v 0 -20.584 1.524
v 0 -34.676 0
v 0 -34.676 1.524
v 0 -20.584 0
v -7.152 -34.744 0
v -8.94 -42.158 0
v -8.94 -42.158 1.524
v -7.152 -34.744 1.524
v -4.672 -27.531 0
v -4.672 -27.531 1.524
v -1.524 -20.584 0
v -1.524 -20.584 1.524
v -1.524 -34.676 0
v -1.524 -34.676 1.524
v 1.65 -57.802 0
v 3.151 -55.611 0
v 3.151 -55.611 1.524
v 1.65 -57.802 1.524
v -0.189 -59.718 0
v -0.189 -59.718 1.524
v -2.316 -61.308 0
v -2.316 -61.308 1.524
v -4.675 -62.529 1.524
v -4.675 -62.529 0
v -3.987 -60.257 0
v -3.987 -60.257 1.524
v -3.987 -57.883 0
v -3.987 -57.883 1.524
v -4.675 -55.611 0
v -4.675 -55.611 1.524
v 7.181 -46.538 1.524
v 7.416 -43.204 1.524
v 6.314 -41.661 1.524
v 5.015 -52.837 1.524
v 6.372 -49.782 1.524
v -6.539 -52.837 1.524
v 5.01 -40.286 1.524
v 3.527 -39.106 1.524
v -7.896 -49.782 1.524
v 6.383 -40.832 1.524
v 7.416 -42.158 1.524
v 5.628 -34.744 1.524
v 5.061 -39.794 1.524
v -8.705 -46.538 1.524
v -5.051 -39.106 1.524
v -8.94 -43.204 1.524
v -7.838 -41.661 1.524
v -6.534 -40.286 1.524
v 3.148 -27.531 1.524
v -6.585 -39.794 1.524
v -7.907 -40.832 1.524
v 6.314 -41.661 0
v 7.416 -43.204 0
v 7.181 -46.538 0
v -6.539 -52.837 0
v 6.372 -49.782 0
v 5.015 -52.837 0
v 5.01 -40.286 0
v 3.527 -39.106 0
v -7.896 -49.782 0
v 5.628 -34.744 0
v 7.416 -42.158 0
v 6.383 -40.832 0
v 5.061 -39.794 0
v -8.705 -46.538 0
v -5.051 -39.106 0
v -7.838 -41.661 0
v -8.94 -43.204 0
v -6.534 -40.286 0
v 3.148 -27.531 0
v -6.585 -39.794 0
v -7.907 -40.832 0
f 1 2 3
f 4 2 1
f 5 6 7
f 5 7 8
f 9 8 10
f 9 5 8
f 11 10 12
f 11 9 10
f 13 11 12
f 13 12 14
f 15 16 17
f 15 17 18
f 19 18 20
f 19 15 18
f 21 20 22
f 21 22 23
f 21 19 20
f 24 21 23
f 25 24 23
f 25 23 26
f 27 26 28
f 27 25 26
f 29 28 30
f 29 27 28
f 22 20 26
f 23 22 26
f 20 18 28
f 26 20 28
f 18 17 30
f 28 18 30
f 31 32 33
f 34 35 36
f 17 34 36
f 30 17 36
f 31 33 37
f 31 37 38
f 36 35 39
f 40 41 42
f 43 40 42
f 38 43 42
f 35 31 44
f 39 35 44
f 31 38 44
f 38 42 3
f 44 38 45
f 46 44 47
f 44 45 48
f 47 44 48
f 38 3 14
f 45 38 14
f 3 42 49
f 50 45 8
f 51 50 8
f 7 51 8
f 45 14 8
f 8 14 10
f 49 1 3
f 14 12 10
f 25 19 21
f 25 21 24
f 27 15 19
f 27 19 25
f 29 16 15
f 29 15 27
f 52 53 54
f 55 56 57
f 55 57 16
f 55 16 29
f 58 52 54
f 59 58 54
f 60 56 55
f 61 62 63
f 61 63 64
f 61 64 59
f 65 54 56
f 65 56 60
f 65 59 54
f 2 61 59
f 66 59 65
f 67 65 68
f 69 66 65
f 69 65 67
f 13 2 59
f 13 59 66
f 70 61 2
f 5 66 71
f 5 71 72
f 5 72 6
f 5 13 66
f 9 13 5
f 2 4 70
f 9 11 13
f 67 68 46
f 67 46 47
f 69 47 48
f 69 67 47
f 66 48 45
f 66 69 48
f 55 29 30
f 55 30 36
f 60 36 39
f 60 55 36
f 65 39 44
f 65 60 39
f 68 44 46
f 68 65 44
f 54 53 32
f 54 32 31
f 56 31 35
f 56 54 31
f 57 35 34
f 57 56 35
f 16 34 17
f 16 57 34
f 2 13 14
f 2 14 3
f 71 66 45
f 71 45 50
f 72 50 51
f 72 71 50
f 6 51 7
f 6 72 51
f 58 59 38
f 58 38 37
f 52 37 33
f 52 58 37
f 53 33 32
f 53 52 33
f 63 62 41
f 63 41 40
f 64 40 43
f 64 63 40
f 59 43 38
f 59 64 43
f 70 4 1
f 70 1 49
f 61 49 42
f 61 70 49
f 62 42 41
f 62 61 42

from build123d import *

# Parameters (mm, degrees)
BOSS_EXTRUDE1_DEPTH = 1.524


with BuildPart() as part:
    # Sketch1 → Boss-Extrude1 (new body)
    with BuildSketch(Plane.XY):
        with BuildLine():
            Line((-1.524, -34.676201819), (0, -34.676201819))
            Line((0, -34.676201819), (0, -20.584065252))
            ThreePointArc((0, -20.584065252), (4.472947003, -31.108201588), (7.416031026, -42.158222264))
            ThreePointArc((7.416031026, -42.158222264), (5.753516475, -40.272714916), (3.52711699, -39.105565432))
            ThreePointArc((3.52711699, -39.105565432), (5.686055365, -40.951036914), (7.416031026, -43.203583054))
            ThreePointArc((7.416031026, -43.203583054), (6.372439306, -49.781793421), (3.150525994, -55.611133859))
            ThreePointArc((3.150525994, -55.611133859), (-0.189129191, -59.717886603), (-4.674525994, -62.528568082))
            ThreePointArc((-4.674525994, -62.528568082), (-3.899739777, -59.06985097), (-4.674525994, -55.611133859))
            ThreePointArc((-4.674525994, -55.611133859), (-7.896439306, -49.781793421), (-8.940031026, -43.203583054))
            ThreePointArc((-8.940031026, -43.203583054), (-7.210055365, -40.951036914), (-5.05111699, -39.105565432))
            ThreePointArc((-5.05111699, -39.105565432), (-7.277516475, -40.272714916), (-8.940031026, -42.158222264))
            ThreePointArc((-8.940031026, -42.158222264), (-5.996947003, -31.108201588), (-1.524, -20.584065252))
            Line((-1.524, -20.584065252), (-1.524, -34.676201819))
        make_face()
    extrude(amount=BOSS_EXTRUDE1_DEPTH)


solid = part.part
